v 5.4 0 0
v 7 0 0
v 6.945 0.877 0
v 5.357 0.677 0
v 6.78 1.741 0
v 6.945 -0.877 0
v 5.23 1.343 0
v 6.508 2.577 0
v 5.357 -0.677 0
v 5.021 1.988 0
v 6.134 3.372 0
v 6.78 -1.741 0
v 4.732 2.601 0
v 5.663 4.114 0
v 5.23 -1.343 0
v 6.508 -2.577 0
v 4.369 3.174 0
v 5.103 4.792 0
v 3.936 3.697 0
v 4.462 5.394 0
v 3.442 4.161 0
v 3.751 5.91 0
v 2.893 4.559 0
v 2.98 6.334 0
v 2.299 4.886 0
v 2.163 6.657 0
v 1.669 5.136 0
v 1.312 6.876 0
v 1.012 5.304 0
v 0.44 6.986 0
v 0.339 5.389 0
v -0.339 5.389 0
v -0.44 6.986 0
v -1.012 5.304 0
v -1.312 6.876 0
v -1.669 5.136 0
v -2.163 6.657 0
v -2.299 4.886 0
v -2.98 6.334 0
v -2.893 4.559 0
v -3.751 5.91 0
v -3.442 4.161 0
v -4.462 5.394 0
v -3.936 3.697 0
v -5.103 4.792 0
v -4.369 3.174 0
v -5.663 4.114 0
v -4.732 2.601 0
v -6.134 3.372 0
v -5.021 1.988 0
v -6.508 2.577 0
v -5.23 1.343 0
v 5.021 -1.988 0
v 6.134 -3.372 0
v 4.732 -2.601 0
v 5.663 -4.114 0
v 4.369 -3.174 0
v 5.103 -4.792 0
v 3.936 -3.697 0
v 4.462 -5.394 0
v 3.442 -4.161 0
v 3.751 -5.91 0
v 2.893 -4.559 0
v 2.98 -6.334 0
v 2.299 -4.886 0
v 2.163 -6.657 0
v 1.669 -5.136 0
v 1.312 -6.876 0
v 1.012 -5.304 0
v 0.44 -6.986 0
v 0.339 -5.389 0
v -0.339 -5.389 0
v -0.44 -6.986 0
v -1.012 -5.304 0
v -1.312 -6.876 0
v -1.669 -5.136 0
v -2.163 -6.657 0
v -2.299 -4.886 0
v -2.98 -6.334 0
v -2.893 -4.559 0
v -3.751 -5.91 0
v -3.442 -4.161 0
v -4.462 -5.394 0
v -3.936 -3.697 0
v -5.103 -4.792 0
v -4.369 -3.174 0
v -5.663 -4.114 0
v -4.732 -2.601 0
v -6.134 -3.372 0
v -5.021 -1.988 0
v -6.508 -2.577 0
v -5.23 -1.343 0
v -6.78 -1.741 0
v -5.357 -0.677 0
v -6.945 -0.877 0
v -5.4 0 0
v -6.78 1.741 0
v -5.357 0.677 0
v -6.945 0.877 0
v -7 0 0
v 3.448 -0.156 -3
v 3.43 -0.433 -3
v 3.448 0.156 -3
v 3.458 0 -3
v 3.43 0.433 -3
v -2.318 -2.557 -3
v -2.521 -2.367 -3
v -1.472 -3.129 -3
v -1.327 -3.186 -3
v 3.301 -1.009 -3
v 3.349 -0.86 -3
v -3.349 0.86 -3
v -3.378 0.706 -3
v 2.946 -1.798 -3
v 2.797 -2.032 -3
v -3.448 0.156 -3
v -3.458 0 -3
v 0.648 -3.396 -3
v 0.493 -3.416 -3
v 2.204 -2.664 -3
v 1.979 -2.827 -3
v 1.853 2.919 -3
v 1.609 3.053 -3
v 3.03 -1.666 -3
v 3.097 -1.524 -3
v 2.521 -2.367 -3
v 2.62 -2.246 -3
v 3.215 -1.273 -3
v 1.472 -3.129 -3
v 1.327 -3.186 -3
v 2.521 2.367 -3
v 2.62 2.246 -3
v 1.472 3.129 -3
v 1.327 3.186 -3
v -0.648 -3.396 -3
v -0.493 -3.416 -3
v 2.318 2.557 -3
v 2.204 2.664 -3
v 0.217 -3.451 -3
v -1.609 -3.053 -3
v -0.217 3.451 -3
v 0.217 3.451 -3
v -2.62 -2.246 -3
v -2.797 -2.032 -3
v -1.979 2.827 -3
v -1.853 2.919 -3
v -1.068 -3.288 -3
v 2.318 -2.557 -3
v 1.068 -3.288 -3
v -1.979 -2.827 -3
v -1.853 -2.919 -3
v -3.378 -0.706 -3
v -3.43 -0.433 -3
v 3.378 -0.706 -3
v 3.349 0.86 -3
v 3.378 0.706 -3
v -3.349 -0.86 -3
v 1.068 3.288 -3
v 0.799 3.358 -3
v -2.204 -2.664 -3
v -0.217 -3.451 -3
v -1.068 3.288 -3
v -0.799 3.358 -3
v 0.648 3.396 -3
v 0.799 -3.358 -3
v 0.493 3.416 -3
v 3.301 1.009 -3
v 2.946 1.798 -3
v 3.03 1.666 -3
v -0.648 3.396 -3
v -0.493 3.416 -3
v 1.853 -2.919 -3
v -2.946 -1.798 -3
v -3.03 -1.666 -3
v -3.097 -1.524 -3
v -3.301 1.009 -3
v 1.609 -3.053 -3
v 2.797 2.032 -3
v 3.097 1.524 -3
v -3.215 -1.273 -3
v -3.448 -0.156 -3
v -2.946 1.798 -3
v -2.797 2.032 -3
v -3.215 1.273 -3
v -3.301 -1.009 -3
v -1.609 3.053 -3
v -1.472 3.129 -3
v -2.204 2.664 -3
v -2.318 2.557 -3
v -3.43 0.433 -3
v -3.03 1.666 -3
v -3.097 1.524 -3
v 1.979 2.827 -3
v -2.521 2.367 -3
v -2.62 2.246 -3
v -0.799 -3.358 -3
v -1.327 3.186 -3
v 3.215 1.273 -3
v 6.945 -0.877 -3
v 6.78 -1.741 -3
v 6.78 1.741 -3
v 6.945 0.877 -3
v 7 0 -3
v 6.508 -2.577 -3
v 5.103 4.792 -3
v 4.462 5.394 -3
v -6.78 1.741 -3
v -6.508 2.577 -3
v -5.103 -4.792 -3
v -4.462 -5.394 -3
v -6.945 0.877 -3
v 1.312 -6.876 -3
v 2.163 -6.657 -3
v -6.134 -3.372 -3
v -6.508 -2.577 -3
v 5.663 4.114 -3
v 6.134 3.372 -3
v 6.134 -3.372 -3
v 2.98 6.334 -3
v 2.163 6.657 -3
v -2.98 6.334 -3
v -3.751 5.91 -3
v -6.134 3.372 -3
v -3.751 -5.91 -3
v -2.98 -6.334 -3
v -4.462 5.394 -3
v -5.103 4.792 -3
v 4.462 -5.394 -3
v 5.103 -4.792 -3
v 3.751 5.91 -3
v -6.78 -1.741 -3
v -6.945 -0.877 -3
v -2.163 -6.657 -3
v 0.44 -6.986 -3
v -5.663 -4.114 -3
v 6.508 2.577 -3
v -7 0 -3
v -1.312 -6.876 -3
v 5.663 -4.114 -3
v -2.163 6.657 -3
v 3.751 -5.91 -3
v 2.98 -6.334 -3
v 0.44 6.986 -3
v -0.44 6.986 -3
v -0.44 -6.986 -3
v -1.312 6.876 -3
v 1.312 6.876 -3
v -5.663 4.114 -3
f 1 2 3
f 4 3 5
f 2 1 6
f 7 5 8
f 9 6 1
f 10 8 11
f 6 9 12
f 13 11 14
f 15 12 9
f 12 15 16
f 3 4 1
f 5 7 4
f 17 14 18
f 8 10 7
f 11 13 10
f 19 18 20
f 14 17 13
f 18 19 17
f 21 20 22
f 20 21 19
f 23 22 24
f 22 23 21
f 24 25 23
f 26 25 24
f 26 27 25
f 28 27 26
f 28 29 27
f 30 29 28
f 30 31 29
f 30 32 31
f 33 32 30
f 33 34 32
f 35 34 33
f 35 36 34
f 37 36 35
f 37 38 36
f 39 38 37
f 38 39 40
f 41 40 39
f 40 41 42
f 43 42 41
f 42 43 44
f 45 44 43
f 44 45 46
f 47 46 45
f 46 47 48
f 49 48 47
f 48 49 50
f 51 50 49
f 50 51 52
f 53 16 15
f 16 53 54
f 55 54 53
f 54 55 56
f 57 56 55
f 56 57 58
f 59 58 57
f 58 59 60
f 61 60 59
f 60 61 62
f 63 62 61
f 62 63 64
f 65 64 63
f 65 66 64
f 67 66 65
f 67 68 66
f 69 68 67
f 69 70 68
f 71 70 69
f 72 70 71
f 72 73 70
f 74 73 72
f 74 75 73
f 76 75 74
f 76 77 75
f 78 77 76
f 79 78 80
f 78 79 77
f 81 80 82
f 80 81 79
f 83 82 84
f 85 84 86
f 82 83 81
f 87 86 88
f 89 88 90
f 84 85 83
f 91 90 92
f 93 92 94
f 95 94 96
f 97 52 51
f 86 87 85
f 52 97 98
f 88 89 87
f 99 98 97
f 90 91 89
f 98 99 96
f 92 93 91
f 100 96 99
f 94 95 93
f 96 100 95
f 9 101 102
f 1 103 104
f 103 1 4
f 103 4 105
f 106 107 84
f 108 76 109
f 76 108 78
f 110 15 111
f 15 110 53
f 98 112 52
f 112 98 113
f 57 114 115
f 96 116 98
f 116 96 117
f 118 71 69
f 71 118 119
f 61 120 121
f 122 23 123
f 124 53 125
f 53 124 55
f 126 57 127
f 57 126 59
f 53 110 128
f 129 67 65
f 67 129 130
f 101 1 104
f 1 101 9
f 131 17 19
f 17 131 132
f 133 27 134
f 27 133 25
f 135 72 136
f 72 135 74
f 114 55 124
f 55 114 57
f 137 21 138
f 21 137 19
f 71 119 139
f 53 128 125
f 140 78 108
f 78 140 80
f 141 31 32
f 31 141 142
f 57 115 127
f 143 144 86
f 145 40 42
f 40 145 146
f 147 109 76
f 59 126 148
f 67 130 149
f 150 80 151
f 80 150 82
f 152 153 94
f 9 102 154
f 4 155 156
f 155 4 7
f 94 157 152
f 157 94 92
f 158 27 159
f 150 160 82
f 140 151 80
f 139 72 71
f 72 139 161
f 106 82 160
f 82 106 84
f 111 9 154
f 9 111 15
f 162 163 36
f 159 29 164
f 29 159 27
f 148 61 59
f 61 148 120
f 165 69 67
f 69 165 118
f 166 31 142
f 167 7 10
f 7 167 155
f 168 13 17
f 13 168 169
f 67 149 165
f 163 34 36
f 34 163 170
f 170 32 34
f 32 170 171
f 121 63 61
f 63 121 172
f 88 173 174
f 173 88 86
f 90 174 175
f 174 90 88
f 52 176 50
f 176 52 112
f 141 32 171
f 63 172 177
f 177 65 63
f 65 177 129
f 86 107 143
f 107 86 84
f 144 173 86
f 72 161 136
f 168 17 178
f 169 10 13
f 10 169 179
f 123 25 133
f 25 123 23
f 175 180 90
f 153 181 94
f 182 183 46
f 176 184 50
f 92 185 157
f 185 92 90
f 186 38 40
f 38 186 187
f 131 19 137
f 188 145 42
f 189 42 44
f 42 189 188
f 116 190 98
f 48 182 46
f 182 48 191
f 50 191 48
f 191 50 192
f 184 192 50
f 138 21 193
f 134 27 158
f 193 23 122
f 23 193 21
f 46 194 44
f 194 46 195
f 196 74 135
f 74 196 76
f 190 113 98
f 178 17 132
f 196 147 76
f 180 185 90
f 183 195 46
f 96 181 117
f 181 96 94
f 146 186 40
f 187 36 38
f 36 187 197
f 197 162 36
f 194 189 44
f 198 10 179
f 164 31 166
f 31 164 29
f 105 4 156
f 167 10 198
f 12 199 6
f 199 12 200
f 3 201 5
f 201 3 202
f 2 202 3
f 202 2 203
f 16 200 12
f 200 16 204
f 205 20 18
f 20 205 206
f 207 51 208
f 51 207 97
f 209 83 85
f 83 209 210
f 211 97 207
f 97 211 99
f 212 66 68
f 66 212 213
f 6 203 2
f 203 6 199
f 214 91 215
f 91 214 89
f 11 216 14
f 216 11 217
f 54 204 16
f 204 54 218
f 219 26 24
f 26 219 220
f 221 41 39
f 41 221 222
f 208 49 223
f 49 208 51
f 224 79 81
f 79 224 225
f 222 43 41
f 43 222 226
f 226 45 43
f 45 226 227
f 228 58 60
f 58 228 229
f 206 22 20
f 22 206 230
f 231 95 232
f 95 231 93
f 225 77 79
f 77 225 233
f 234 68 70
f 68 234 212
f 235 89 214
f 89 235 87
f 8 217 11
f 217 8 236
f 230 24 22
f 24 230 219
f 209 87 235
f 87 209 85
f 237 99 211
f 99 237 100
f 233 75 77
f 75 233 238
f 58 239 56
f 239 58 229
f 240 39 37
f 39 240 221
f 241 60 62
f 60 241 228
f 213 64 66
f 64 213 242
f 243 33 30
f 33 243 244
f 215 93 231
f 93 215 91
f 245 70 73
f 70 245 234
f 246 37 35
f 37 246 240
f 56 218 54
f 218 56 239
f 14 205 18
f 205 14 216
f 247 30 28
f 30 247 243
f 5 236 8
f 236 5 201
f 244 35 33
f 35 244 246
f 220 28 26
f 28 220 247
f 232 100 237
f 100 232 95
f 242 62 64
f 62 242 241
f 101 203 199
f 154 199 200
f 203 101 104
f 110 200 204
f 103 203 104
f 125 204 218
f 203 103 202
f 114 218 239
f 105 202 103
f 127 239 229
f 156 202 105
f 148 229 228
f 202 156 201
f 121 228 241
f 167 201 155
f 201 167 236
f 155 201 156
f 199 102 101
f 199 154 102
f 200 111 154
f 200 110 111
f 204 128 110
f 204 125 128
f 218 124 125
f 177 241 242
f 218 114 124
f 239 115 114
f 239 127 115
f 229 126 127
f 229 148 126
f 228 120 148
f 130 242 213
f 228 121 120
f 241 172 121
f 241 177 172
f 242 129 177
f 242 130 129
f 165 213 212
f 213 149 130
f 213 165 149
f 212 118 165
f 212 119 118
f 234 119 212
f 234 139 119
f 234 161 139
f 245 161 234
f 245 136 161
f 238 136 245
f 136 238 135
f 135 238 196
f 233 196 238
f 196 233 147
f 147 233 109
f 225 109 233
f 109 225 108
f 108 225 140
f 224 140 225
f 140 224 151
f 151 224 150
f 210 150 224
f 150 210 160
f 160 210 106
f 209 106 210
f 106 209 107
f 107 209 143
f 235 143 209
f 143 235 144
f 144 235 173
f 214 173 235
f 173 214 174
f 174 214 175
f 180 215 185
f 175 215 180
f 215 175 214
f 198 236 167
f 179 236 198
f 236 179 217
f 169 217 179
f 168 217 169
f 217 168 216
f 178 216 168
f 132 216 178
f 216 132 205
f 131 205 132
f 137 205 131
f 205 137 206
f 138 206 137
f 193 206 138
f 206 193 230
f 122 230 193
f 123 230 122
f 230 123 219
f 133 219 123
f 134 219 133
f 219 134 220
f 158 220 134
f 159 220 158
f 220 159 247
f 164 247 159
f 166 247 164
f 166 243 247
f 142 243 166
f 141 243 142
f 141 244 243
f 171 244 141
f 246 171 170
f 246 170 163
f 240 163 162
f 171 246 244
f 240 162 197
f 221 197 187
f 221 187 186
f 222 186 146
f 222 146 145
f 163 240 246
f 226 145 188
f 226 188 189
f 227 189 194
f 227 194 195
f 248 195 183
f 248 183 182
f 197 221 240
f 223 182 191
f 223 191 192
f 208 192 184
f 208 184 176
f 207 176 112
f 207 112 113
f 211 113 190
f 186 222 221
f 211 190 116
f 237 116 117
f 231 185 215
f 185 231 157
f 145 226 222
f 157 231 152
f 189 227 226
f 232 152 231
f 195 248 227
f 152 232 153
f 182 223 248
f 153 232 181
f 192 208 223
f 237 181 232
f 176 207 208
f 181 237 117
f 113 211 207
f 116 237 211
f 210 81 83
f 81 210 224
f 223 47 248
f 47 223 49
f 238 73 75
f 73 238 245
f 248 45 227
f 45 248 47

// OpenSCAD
$fn = 50;


difference() {
	union() {
		translate(v = [0, 0, -3.0000000000]) {
			cylinder(h = 3, r = 7.0000000000);
		}
		cylinder(h = 0, r = 16.0000000000);
	}
	union() {
		translate(v = [0, 0, 0]) {
			rotate(a = [0, 0, 0]) {
				difference() {
					union() {
						#translate(v = [0, 0, -3.0000000000]) {
							cylinder(h = 3, r = 2.6000000000);
						}
						#translate(v = [0, 0, -3.9000000000]) {
							cylinder(h = 3.9000000000, r = 7.0000000000, r1 = 2.8750000000, r2 = 5.4000000000);
						}
						#translate(v = [0, 0, -3.0000000000]) {
							cylinder(h = 3, r = 2.8750000000);
						}
						#translate(v = [0, 0, -3.0000000000]) {
							cylinder(h = 3, r = 2.6000000000);
						}
					}
					union();
				}
			}
		}
	}
}
